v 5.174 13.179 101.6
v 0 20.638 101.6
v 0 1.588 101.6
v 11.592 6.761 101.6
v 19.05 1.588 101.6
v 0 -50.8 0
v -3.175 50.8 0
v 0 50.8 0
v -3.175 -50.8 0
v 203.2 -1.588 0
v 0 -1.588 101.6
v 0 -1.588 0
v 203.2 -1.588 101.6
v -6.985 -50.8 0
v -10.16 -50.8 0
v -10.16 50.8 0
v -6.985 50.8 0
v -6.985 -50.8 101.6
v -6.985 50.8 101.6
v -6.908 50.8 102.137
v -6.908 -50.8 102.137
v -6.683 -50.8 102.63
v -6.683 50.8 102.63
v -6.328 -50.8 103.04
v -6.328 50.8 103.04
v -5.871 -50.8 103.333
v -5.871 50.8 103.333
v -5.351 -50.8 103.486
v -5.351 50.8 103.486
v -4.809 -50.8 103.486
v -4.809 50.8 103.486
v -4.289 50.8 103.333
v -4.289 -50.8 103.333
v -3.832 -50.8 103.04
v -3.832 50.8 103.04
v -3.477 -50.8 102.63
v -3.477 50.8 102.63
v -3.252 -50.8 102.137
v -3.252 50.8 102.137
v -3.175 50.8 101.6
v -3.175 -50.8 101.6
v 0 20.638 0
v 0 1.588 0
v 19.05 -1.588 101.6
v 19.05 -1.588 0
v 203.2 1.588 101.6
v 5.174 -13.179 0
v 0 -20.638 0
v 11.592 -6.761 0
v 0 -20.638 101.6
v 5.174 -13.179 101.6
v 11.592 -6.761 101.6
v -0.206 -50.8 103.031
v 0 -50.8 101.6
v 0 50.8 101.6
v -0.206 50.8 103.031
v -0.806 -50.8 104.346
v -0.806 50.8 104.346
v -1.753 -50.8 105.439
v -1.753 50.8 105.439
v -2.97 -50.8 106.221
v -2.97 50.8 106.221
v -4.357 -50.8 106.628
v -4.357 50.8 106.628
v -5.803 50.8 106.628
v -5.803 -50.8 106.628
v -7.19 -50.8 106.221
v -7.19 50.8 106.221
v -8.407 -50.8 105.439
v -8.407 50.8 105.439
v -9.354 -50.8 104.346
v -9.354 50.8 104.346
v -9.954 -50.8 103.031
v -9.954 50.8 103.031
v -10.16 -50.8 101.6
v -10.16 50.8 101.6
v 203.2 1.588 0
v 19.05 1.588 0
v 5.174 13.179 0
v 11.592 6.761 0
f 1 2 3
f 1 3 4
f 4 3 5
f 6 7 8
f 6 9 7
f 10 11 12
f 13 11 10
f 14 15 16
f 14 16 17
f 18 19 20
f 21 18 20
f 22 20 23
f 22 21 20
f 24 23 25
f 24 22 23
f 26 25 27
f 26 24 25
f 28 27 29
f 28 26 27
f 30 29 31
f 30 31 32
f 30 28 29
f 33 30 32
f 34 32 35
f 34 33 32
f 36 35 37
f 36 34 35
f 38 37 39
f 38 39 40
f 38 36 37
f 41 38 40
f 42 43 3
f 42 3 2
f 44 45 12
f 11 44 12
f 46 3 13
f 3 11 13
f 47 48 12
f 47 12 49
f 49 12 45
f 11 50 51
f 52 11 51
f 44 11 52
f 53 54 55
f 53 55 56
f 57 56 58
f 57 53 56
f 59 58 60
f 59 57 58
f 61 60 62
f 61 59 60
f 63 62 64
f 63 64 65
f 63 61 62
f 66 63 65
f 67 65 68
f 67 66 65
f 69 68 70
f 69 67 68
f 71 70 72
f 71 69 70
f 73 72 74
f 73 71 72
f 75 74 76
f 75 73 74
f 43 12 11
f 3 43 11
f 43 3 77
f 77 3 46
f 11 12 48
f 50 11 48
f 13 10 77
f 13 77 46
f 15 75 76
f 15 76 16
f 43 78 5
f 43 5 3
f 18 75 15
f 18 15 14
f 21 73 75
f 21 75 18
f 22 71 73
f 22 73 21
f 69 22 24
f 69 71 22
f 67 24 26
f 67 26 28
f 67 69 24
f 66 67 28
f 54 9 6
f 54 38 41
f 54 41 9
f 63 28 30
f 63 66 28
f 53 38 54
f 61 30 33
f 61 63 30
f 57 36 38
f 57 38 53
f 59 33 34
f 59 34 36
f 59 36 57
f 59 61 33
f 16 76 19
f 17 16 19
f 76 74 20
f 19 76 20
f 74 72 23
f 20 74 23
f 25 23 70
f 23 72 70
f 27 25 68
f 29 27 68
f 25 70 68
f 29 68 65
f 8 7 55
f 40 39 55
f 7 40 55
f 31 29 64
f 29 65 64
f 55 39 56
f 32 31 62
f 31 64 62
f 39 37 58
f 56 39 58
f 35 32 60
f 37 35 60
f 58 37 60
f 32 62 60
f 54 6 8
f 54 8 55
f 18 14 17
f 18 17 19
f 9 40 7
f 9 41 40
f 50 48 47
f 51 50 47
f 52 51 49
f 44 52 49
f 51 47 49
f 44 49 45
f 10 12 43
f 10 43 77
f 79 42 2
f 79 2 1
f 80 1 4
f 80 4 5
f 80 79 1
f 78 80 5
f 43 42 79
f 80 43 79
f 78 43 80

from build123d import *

# Parameters (mm, degrees)
F0_W     = 203.2
F0_H     = 101.6
F1_DEPTH = 1.5875
F3_DEPTH = 50.8
F5_DEPTH = 101.6


with BuildPart() as f1:
    # F0 (on Front) → F1 (new body, symmetric)
    with BuildSketch(Plane.XZ):
        with Locations((101.6, 50.8)):
            Rectangle(F0_W, F0_H)
    extrude(amount=F1_DEPTH, both=True)


with BuildPart() as f3:
    # F2 (on Front) → F3 (new body, symmetric)
    with BuildSketch(Plane.XZ):
        with BuildLine():
            Line((-3.175, 0), (0, 0))
            Line((0, 0), (0, 101.6))
            ThreePointArc((0, 101.6), (-5.08, 106.68), (-10.16, 101.6))
            Line((-10.16, 101.6), (-10.16, 0))
            Line((-10.16, 0), (-6.985, 0))
            Line((-6.985, 0), (-6.985, 101.6))
            ThreePointArc((-6.985, 101.6), (-5.08, 103.505), (-3.175, 101.6))
            Line((-3.175, 101.6), (-3.175, 0))
        make_face()
    extrude(amount=F3_DEPTH, both=True)


with BuildPart() as f5:
    # F4 (on Top) → F5 (new body, through all)
    with BuildSketch(Plane.XY):
        with BuildLine():
            Line((0, -1.5875), (0, -20.6375))
            ThreePointArc((0, -20.6375), (8.239136, -9.826636), (19.05, -1.5875))
            Line((19.05, -1.5875), (0, -1.5875))
        make_face()
    extrude(amount=F5_DEPTH)


with BuildPart() as f6_1:
    # F6: instance of F5
    add(f5.part.mirror(Plane.XZ))


solid = Compound([f1.part, f3.part, f5.part, f6_1.part])
